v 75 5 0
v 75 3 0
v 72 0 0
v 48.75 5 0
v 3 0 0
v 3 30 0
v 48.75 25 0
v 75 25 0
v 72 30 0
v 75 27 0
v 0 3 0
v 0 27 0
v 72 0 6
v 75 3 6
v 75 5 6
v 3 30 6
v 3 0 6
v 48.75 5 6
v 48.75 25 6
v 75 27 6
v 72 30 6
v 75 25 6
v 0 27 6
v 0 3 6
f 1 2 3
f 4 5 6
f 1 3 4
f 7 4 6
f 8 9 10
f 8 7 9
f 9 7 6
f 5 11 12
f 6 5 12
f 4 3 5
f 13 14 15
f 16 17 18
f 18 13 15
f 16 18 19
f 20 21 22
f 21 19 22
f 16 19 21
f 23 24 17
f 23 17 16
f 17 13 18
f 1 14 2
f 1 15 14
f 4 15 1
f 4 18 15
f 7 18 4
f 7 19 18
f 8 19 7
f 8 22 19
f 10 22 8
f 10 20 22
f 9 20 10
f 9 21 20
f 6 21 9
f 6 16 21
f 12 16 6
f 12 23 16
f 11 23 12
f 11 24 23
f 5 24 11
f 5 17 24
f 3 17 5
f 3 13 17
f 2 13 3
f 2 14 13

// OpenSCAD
$fn = 32;

// ----------------------------------------------------------------------
// C washer: 75 x 30 mm plate with an open slot
// ----------------------------------------------------------------------

// --- parameters (mm) ---
profile_height = 6;       // extrusion height
profile_points = 12;      // points of the closed outline

profile = [[3, 0], [72, 0], [75, 3], [75, 5], [48.75, 5], [48.75, 25], [75, 25], [75, 27], [72, 30], [3, 30], [0, 27], [0, 3]];  // single closed polygon, 12 points, counter clockwise

// --- the one profile operation ---
linear_extrude(height = profile_height) polygon(points = profile);
